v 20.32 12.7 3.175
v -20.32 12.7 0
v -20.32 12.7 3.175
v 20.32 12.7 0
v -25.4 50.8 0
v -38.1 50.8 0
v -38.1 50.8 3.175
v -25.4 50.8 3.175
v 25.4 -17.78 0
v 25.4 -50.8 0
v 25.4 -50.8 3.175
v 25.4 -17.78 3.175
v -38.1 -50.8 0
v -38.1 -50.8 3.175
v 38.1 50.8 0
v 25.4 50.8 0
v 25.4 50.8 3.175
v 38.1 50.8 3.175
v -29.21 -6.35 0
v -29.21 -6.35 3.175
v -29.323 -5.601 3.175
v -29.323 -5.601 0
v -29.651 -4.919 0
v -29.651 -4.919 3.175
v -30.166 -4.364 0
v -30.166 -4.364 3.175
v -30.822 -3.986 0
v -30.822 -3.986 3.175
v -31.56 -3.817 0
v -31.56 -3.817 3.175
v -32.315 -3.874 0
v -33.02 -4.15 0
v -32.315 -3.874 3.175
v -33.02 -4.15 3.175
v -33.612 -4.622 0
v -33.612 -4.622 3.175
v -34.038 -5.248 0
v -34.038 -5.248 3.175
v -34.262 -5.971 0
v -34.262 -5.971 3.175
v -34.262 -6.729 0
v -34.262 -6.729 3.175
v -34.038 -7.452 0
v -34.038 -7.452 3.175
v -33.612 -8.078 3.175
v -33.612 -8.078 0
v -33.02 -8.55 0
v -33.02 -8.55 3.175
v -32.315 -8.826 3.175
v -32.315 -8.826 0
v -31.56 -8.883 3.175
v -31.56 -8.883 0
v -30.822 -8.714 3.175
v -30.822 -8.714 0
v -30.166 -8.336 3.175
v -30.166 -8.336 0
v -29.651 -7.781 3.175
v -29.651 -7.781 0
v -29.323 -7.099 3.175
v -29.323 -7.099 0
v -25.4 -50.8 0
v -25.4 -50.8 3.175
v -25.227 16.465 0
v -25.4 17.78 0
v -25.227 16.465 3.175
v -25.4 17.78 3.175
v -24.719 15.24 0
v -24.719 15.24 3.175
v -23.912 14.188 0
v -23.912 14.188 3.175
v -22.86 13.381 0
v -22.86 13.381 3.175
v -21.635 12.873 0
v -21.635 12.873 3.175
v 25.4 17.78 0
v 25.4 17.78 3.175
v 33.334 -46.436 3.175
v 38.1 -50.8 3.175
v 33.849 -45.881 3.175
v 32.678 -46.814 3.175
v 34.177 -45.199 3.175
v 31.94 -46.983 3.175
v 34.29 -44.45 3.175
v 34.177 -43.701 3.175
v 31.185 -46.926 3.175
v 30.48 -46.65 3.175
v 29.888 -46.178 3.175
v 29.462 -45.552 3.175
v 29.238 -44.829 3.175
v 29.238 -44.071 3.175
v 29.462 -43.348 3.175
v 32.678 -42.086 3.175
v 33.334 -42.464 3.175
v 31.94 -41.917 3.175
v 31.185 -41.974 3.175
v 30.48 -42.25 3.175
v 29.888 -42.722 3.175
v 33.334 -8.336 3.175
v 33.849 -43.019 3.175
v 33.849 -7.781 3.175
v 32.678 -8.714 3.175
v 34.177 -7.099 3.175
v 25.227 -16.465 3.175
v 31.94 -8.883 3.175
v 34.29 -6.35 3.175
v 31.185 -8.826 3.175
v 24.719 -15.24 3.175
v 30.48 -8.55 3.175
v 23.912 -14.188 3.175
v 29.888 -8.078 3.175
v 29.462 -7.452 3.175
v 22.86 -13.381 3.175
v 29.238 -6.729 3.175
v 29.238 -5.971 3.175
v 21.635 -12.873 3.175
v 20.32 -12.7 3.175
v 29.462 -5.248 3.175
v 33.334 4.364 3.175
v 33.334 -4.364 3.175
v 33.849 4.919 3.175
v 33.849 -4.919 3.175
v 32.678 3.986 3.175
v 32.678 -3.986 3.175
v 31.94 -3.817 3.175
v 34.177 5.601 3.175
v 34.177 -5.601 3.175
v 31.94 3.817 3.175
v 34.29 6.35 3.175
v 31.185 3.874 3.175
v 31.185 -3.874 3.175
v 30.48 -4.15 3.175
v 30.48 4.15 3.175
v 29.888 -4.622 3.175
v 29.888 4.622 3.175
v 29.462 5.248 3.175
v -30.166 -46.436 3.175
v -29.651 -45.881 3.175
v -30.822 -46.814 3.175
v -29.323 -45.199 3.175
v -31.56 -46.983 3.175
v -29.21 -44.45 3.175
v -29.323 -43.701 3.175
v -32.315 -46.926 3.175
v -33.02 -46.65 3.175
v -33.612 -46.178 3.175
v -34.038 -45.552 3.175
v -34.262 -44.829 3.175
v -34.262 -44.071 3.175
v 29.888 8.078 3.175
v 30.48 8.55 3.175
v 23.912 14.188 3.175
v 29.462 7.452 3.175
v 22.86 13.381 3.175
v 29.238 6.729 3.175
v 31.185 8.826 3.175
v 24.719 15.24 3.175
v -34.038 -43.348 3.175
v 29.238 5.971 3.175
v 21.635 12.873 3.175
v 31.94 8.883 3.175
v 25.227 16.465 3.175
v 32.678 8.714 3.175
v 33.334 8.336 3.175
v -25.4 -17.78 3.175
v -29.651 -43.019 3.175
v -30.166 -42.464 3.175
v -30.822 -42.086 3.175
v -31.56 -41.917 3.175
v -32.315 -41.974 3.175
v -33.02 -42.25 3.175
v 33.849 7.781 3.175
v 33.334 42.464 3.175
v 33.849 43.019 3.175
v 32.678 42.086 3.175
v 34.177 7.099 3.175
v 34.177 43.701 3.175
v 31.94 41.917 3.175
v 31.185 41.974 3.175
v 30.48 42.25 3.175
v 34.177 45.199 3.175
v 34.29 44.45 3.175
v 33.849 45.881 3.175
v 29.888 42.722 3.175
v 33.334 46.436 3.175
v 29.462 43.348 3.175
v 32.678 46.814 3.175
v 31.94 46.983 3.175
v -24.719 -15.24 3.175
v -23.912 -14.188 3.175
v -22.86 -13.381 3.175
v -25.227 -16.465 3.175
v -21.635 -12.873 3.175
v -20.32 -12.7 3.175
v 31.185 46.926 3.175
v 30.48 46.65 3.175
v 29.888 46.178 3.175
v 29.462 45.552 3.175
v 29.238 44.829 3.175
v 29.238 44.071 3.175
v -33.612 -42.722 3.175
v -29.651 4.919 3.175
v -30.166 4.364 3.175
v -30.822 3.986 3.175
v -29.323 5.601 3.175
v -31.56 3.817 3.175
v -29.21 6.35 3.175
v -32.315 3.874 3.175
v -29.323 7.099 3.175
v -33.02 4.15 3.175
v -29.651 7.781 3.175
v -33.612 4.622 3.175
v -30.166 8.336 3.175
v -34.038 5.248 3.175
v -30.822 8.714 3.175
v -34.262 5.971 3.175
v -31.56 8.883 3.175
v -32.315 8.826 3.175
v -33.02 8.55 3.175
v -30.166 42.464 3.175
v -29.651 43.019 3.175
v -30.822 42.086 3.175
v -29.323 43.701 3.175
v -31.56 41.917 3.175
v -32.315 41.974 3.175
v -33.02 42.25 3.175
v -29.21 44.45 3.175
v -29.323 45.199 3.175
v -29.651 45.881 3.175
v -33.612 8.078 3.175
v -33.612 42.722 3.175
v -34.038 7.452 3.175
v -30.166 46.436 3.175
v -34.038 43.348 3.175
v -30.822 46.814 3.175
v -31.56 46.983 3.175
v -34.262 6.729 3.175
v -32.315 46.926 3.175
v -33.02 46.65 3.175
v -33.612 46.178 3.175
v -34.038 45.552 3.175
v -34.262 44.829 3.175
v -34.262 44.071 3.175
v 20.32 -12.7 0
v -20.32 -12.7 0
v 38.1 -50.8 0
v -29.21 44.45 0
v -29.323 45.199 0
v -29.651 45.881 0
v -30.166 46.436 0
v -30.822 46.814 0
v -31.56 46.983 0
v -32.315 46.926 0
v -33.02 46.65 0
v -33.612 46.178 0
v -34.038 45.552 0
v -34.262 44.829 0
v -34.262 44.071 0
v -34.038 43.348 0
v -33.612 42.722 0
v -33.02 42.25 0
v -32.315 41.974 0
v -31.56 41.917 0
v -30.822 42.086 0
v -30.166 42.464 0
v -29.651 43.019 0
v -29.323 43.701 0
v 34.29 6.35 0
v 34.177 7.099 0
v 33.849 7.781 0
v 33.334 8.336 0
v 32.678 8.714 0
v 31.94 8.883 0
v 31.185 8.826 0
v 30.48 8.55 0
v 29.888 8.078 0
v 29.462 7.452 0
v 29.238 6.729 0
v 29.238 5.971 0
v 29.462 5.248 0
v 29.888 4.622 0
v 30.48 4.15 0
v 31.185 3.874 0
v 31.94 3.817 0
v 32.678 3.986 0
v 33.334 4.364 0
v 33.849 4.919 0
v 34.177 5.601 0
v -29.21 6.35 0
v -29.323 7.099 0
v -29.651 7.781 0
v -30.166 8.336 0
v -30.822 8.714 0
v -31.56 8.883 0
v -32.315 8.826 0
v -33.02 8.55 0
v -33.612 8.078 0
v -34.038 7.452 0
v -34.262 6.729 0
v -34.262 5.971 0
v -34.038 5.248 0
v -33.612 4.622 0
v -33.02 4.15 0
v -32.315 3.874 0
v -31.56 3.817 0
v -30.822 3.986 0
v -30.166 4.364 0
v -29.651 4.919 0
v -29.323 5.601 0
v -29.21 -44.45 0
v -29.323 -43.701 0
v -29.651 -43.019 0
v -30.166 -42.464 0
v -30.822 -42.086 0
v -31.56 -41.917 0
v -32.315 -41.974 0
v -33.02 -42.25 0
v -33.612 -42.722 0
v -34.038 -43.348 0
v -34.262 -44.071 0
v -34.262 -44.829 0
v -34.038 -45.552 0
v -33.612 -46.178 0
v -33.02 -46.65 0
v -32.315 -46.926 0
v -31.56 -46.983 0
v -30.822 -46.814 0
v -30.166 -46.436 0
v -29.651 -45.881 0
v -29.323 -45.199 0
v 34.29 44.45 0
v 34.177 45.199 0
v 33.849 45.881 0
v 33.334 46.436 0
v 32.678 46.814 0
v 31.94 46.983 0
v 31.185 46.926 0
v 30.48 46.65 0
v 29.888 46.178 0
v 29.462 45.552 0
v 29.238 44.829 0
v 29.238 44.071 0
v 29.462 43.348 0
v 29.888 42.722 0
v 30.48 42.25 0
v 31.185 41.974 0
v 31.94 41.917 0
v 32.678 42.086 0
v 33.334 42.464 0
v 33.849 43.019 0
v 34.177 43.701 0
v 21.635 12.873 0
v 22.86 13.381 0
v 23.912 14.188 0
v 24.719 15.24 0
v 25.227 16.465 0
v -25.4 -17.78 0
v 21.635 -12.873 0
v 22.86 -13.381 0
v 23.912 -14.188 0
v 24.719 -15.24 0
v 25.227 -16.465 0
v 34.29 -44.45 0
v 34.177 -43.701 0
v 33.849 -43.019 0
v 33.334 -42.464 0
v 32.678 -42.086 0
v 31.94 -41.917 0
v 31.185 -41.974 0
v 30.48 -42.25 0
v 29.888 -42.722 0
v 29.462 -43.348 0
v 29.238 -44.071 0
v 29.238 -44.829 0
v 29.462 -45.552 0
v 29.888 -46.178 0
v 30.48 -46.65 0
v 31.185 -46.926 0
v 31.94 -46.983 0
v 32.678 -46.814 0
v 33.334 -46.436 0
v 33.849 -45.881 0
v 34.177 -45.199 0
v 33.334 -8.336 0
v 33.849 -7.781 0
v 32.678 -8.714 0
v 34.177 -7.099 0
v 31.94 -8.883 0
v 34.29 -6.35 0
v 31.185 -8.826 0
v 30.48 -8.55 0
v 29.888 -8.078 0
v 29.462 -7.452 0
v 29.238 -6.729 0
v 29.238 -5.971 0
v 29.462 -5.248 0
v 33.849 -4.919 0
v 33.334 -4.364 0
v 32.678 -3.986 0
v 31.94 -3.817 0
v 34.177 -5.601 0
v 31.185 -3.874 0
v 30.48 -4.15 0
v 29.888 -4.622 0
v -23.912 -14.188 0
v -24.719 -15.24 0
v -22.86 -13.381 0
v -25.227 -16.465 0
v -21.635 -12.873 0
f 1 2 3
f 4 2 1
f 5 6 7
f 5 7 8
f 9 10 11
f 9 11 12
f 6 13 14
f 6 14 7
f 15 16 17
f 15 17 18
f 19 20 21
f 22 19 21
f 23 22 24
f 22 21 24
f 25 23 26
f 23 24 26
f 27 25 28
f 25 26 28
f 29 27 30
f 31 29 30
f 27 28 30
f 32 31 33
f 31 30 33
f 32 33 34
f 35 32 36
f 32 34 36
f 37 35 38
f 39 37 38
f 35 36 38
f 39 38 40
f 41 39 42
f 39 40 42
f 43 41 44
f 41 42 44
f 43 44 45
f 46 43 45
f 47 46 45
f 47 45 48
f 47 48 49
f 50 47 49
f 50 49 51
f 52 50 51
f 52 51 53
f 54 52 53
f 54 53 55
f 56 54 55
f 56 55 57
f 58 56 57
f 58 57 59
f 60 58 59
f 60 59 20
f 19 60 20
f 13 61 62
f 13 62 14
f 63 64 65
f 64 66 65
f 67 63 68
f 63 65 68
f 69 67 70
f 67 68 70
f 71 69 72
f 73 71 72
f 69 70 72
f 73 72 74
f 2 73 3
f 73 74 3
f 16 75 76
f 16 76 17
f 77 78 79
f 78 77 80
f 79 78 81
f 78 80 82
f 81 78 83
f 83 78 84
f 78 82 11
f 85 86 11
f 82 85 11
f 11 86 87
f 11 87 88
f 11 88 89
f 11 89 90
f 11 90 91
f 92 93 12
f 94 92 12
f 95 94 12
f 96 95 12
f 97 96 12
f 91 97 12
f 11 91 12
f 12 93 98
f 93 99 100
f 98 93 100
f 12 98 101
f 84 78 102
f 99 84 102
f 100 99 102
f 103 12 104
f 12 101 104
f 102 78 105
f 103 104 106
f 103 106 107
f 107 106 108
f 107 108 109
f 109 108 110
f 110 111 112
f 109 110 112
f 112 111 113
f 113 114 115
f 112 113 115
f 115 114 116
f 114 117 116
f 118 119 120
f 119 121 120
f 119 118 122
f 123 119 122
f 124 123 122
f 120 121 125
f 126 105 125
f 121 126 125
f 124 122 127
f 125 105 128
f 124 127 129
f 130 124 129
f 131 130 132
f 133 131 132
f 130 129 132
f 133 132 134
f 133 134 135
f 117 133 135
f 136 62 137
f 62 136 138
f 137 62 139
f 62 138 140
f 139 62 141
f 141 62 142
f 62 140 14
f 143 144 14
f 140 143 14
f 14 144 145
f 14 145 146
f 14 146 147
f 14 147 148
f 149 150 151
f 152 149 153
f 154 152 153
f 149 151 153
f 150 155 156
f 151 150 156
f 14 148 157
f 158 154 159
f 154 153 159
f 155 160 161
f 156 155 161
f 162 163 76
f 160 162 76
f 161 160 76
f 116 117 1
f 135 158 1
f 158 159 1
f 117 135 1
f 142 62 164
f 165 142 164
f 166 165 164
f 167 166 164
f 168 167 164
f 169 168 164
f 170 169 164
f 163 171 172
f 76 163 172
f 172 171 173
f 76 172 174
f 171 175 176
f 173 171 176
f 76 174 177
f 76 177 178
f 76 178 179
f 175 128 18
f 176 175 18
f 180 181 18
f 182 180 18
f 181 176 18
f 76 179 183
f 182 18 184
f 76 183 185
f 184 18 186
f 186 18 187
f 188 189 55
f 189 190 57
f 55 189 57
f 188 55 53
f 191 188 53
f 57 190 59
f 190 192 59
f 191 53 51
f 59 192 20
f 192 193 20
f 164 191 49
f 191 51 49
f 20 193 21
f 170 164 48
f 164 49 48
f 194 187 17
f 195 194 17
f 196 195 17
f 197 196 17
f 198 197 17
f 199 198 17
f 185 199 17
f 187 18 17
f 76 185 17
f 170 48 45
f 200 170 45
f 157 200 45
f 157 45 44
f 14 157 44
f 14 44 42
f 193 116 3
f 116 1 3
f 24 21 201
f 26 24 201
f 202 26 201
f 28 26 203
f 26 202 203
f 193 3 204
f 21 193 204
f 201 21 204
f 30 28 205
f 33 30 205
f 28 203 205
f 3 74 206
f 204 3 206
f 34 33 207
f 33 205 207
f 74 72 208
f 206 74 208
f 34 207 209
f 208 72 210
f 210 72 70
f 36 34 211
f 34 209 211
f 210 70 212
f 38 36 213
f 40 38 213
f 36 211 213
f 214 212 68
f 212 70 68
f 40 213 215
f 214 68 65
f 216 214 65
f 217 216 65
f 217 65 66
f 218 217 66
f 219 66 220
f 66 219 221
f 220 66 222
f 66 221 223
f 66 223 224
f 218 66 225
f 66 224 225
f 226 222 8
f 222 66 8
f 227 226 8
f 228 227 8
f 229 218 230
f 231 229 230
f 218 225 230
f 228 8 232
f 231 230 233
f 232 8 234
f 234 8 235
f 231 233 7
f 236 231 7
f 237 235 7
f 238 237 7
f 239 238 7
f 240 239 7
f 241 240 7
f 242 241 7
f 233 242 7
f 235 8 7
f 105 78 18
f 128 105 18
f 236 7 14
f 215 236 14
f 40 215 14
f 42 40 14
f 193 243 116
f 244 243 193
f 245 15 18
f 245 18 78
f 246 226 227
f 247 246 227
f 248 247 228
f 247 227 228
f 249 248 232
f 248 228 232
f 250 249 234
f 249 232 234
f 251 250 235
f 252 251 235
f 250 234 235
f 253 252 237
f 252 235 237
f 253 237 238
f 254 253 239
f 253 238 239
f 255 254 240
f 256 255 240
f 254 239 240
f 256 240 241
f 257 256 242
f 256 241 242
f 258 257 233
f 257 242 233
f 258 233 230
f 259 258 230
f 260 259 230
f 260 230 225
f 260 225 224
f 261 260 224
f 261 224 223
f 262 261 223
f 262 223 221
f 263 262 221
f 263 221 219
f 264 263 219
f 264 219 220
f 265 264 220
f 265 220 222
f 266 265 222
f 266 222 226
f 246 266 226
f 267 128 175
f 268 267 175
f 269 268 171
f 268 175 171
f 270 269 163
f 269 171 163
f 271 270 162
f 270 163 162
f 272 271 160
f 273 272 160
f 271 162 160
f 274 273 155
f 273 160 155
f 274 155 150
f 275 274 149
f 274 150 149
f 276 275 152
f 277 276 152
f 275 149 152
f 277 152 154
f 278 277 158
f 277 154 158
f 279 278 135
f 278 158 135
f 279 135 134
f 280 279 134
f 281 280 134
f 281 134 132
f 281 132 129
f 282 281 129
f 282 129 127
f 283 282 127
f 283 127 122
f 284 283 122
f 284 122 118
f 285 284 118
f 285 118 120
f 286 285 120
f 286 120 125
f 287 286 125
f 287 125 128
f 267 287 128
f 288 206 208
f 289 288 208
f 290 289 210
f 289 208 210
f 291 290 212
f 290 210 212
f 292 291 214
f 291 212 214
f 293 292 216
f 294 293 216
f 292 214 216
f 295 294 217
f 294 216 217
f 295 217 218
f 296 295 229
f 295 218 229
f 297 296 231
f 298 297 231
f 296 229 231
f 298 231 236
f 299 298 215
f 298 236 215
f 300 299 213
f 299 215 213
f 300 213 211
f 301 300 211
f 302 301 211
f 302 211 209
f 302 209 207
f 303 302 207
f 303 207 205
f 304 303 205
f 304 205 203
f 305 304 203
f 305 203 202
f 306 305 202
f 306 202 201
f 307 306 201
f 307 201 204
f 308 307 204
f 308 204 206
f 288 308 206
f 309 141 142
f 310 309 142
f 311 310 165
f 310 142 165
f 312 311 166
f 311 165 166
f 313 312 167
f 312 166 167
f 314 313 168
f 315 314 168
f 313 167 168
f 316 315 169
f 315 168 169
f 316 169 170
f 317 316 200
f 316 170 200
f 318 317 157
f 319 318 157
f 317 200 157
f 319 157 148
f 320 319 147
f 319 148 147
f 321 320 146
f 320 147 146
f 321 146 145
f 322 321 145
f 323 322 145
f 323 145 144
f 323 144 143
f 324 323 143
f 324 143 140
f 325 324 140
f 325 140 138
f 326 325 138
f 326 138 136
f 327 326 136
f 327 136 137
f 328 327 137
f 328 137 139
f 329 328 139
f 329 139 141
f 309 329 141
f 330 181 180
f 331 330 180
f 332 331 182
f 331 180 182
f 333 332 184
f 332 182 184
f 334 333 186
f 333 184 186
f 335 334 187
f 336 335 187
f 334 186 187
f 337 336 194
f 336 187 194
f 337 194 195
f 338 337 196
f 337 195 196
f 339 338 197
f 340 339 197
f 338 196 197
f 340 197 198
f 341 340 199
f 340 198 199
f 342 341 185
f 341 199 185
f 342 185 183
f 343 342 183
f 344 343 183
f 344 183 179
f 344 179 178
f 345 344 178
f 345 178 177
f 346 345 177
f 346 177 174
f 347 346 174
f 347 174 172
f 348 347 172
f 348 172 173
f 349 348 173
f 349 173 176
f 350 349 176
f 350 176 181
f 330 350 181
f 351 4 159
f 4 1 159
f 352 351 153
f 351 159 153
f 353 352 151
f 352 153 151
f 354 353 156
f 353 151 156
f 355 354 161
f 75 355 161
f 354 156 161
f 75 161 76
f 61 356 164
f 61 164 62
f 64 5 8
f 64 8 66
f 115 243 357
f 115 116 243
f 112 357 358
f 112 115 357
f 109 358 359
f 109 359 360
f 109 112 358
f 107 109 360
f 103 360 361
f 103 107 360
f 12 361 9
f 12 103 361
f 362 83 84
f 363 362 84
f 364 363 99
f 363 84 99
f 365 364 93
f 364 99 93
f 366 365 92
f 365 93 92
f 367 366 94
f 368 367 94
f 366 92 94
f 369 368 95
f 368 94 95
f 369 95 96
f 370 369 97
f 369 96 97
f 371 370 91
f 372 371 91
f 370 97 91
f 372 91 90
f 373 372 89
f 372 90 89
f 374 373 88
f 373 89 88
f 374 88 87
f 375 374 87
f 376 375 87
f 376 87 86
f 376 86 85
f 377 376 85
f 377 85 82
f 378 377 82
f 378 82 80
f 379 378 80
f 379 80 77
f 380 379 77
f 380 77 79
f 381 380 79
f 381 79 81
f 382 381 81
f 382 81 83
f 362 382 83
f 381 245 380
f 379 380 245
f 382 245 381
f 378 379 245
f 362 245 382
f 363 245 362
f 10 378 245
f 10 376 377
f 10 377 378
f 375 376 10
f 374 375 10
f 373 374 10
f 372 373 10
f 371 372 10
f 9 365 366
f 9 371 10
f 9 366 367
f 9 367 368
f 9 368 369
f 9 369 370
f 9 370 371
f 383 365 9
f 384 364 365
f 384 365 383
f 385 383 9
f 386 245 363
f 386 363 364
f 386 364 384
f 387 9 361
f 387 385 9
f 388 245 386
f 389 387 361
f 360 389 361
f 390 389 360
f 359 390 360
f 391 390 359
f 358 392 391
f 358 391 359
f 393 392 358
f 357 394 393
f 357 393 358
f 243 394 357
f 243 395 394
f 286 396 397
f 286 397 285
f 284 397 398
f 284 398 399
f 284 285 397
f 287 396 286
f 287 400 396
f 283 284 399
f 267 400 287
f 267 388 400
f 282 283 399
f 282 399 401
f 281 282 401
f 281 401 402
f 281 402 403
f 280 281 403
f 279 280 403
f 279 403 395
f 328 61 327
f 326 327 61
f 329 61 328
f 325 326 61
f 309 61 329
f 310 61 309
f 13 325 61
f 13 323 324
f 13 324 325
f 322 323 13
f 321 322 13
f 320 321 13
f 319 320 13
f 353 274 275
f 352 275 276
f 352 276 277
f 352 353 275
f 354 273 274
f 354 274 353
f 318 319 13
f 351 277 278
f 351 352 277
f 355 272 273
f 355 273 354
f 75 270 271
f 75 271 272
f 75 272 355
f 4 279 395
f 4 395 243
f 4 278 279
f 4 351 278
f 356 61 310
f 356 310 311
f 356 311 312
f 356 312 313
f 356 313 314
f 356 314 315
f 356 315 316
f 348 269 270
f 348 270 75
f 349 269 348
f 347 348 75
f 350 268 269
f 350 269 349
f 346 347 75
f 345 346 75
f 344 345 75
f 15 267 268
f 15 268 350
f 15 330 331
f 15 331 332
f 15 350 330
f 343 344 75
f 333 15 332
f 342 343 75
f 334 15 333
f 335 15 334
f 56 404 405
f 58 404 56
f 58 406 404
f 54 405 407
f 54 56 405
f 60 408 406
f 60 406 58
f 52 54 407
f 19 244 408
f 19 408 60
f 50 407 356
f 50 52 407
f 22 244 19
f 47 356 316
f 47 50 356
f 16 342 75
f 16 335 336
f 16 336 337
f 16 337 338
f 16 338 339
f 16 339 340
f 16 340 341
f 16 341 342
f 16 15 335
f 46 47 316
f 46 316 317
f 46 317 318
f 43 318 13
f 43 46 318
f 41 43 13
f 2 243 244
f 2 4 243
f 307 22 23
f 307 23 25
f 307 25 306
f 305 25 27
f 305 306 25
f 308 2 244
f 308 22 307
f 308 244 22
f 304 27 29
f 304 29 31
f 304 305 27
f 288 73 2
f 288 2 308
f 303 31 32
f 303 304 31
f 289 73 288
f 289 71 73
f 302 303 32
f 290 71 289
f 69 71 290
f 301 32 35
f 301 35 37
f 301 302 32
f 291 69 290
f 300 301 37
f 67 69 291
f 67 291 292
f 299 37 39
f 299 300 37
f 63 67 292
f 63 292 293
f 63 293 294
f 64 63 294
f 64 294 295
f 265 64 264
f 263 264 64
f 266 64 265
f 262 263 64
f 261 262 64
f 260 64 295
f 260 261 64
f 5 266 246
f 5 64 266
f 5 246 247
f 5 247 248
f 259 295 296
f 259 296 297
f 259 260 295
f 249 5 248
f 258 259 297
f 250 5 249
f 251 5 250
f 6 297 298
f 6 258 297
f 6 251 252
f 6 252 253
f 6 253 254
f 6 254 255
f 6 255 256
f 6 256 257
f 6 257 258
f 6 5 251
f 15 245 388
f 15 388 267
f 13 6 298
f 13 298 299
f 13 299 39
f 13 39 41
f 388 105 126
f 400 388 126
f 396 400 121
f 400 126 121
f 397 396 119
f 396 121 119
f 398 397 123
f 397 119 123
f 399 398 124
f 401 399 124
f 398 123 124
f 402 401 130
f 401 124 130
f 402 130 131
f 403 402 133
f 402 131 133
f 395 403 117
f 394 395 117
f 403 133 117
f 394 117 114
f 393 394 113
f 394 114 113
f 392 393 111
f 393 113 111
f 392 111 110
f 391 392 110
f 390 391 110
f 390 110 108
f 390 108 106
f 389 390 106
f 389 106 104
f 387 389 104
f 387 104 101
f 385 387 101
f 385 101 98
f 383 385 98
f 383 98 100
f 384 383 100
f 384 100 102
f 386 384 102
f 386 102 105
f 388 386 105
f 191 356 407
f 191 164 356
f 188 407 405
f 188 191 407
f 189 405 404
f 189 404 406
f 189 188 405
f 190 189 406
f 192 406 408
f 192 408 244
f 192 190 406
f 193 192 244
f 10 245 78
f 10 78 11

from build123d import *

# Parameters (mm, degrees)
BOSS_EXTRUDE1_DEPTH = 3.175
SKETCH4_R           = 2.54
CUT_EXTRUDE3_DEPTH  = 4.175
FILLET1_R           = 5.08


with BuildPart() as part:
    # Sketch1 → Boss-Extrude1 (new body)
    with BuildSketch(Plane.XY):
        Polygon((-38.1, 50.8), (-25.4, 50.8), (-25.4, 12.7), (25.4, 12.7), (25.4, 50.8), (38.1, 50.8), (38.1, -50.8), (25.4, -50.8), (25.4, -12.7), (-25.4, -12.7), (-25.4, -50.8), (-38.1, -50.8), align=None)
    extrude(amount=BOSS_EXTRUDE1_DEPTH)

    # Sketch4 → Cut-Extrude3 (cut, through all)
    with BuildSketch(Plane.XY.offset(3.175)):
        with Locations((-31.75, 44.45)):
            Circle(SKETCH4_R)
        with Locations((-31.75, 6.35)):
            Circle(SKETCH4_R)
        with Locations((31.75, 6.35)):
            Circle(SKETCH4_R)
        with Locations((31.75, 44.45)):
            Circle(SKETCH4_R)
        with Locations((-31.75, -6.35)):
            Circle(SKETCH4_R)
        with Locations((31.75, -6.35)):
            Circle(SKETCH4_R)
        with Locations((31.75, -44.45)):
            Circle(SKETCH4_R)
        with Locations((-31.75, -44.45)):
            Circle(SKETCH4_R)
    extrude(amount=-CUT_EXTRUDE3_DEPTH, mode=Mode.SUBTRACT)

    # Fillet1
    fillet1_edges = [part.edges().sort_by_distance(p)[0] for p in [
        (25.4, -12.7, 1.5875),
        (-25.4, -12.7, 1.5875),
        (-25.4, 12.7, 1.5875),
        (25.4, 12.7, 1.5875),
    ]]
    fillet(fillet1_edges, radius=FILLET1_R)


solid = part.part
